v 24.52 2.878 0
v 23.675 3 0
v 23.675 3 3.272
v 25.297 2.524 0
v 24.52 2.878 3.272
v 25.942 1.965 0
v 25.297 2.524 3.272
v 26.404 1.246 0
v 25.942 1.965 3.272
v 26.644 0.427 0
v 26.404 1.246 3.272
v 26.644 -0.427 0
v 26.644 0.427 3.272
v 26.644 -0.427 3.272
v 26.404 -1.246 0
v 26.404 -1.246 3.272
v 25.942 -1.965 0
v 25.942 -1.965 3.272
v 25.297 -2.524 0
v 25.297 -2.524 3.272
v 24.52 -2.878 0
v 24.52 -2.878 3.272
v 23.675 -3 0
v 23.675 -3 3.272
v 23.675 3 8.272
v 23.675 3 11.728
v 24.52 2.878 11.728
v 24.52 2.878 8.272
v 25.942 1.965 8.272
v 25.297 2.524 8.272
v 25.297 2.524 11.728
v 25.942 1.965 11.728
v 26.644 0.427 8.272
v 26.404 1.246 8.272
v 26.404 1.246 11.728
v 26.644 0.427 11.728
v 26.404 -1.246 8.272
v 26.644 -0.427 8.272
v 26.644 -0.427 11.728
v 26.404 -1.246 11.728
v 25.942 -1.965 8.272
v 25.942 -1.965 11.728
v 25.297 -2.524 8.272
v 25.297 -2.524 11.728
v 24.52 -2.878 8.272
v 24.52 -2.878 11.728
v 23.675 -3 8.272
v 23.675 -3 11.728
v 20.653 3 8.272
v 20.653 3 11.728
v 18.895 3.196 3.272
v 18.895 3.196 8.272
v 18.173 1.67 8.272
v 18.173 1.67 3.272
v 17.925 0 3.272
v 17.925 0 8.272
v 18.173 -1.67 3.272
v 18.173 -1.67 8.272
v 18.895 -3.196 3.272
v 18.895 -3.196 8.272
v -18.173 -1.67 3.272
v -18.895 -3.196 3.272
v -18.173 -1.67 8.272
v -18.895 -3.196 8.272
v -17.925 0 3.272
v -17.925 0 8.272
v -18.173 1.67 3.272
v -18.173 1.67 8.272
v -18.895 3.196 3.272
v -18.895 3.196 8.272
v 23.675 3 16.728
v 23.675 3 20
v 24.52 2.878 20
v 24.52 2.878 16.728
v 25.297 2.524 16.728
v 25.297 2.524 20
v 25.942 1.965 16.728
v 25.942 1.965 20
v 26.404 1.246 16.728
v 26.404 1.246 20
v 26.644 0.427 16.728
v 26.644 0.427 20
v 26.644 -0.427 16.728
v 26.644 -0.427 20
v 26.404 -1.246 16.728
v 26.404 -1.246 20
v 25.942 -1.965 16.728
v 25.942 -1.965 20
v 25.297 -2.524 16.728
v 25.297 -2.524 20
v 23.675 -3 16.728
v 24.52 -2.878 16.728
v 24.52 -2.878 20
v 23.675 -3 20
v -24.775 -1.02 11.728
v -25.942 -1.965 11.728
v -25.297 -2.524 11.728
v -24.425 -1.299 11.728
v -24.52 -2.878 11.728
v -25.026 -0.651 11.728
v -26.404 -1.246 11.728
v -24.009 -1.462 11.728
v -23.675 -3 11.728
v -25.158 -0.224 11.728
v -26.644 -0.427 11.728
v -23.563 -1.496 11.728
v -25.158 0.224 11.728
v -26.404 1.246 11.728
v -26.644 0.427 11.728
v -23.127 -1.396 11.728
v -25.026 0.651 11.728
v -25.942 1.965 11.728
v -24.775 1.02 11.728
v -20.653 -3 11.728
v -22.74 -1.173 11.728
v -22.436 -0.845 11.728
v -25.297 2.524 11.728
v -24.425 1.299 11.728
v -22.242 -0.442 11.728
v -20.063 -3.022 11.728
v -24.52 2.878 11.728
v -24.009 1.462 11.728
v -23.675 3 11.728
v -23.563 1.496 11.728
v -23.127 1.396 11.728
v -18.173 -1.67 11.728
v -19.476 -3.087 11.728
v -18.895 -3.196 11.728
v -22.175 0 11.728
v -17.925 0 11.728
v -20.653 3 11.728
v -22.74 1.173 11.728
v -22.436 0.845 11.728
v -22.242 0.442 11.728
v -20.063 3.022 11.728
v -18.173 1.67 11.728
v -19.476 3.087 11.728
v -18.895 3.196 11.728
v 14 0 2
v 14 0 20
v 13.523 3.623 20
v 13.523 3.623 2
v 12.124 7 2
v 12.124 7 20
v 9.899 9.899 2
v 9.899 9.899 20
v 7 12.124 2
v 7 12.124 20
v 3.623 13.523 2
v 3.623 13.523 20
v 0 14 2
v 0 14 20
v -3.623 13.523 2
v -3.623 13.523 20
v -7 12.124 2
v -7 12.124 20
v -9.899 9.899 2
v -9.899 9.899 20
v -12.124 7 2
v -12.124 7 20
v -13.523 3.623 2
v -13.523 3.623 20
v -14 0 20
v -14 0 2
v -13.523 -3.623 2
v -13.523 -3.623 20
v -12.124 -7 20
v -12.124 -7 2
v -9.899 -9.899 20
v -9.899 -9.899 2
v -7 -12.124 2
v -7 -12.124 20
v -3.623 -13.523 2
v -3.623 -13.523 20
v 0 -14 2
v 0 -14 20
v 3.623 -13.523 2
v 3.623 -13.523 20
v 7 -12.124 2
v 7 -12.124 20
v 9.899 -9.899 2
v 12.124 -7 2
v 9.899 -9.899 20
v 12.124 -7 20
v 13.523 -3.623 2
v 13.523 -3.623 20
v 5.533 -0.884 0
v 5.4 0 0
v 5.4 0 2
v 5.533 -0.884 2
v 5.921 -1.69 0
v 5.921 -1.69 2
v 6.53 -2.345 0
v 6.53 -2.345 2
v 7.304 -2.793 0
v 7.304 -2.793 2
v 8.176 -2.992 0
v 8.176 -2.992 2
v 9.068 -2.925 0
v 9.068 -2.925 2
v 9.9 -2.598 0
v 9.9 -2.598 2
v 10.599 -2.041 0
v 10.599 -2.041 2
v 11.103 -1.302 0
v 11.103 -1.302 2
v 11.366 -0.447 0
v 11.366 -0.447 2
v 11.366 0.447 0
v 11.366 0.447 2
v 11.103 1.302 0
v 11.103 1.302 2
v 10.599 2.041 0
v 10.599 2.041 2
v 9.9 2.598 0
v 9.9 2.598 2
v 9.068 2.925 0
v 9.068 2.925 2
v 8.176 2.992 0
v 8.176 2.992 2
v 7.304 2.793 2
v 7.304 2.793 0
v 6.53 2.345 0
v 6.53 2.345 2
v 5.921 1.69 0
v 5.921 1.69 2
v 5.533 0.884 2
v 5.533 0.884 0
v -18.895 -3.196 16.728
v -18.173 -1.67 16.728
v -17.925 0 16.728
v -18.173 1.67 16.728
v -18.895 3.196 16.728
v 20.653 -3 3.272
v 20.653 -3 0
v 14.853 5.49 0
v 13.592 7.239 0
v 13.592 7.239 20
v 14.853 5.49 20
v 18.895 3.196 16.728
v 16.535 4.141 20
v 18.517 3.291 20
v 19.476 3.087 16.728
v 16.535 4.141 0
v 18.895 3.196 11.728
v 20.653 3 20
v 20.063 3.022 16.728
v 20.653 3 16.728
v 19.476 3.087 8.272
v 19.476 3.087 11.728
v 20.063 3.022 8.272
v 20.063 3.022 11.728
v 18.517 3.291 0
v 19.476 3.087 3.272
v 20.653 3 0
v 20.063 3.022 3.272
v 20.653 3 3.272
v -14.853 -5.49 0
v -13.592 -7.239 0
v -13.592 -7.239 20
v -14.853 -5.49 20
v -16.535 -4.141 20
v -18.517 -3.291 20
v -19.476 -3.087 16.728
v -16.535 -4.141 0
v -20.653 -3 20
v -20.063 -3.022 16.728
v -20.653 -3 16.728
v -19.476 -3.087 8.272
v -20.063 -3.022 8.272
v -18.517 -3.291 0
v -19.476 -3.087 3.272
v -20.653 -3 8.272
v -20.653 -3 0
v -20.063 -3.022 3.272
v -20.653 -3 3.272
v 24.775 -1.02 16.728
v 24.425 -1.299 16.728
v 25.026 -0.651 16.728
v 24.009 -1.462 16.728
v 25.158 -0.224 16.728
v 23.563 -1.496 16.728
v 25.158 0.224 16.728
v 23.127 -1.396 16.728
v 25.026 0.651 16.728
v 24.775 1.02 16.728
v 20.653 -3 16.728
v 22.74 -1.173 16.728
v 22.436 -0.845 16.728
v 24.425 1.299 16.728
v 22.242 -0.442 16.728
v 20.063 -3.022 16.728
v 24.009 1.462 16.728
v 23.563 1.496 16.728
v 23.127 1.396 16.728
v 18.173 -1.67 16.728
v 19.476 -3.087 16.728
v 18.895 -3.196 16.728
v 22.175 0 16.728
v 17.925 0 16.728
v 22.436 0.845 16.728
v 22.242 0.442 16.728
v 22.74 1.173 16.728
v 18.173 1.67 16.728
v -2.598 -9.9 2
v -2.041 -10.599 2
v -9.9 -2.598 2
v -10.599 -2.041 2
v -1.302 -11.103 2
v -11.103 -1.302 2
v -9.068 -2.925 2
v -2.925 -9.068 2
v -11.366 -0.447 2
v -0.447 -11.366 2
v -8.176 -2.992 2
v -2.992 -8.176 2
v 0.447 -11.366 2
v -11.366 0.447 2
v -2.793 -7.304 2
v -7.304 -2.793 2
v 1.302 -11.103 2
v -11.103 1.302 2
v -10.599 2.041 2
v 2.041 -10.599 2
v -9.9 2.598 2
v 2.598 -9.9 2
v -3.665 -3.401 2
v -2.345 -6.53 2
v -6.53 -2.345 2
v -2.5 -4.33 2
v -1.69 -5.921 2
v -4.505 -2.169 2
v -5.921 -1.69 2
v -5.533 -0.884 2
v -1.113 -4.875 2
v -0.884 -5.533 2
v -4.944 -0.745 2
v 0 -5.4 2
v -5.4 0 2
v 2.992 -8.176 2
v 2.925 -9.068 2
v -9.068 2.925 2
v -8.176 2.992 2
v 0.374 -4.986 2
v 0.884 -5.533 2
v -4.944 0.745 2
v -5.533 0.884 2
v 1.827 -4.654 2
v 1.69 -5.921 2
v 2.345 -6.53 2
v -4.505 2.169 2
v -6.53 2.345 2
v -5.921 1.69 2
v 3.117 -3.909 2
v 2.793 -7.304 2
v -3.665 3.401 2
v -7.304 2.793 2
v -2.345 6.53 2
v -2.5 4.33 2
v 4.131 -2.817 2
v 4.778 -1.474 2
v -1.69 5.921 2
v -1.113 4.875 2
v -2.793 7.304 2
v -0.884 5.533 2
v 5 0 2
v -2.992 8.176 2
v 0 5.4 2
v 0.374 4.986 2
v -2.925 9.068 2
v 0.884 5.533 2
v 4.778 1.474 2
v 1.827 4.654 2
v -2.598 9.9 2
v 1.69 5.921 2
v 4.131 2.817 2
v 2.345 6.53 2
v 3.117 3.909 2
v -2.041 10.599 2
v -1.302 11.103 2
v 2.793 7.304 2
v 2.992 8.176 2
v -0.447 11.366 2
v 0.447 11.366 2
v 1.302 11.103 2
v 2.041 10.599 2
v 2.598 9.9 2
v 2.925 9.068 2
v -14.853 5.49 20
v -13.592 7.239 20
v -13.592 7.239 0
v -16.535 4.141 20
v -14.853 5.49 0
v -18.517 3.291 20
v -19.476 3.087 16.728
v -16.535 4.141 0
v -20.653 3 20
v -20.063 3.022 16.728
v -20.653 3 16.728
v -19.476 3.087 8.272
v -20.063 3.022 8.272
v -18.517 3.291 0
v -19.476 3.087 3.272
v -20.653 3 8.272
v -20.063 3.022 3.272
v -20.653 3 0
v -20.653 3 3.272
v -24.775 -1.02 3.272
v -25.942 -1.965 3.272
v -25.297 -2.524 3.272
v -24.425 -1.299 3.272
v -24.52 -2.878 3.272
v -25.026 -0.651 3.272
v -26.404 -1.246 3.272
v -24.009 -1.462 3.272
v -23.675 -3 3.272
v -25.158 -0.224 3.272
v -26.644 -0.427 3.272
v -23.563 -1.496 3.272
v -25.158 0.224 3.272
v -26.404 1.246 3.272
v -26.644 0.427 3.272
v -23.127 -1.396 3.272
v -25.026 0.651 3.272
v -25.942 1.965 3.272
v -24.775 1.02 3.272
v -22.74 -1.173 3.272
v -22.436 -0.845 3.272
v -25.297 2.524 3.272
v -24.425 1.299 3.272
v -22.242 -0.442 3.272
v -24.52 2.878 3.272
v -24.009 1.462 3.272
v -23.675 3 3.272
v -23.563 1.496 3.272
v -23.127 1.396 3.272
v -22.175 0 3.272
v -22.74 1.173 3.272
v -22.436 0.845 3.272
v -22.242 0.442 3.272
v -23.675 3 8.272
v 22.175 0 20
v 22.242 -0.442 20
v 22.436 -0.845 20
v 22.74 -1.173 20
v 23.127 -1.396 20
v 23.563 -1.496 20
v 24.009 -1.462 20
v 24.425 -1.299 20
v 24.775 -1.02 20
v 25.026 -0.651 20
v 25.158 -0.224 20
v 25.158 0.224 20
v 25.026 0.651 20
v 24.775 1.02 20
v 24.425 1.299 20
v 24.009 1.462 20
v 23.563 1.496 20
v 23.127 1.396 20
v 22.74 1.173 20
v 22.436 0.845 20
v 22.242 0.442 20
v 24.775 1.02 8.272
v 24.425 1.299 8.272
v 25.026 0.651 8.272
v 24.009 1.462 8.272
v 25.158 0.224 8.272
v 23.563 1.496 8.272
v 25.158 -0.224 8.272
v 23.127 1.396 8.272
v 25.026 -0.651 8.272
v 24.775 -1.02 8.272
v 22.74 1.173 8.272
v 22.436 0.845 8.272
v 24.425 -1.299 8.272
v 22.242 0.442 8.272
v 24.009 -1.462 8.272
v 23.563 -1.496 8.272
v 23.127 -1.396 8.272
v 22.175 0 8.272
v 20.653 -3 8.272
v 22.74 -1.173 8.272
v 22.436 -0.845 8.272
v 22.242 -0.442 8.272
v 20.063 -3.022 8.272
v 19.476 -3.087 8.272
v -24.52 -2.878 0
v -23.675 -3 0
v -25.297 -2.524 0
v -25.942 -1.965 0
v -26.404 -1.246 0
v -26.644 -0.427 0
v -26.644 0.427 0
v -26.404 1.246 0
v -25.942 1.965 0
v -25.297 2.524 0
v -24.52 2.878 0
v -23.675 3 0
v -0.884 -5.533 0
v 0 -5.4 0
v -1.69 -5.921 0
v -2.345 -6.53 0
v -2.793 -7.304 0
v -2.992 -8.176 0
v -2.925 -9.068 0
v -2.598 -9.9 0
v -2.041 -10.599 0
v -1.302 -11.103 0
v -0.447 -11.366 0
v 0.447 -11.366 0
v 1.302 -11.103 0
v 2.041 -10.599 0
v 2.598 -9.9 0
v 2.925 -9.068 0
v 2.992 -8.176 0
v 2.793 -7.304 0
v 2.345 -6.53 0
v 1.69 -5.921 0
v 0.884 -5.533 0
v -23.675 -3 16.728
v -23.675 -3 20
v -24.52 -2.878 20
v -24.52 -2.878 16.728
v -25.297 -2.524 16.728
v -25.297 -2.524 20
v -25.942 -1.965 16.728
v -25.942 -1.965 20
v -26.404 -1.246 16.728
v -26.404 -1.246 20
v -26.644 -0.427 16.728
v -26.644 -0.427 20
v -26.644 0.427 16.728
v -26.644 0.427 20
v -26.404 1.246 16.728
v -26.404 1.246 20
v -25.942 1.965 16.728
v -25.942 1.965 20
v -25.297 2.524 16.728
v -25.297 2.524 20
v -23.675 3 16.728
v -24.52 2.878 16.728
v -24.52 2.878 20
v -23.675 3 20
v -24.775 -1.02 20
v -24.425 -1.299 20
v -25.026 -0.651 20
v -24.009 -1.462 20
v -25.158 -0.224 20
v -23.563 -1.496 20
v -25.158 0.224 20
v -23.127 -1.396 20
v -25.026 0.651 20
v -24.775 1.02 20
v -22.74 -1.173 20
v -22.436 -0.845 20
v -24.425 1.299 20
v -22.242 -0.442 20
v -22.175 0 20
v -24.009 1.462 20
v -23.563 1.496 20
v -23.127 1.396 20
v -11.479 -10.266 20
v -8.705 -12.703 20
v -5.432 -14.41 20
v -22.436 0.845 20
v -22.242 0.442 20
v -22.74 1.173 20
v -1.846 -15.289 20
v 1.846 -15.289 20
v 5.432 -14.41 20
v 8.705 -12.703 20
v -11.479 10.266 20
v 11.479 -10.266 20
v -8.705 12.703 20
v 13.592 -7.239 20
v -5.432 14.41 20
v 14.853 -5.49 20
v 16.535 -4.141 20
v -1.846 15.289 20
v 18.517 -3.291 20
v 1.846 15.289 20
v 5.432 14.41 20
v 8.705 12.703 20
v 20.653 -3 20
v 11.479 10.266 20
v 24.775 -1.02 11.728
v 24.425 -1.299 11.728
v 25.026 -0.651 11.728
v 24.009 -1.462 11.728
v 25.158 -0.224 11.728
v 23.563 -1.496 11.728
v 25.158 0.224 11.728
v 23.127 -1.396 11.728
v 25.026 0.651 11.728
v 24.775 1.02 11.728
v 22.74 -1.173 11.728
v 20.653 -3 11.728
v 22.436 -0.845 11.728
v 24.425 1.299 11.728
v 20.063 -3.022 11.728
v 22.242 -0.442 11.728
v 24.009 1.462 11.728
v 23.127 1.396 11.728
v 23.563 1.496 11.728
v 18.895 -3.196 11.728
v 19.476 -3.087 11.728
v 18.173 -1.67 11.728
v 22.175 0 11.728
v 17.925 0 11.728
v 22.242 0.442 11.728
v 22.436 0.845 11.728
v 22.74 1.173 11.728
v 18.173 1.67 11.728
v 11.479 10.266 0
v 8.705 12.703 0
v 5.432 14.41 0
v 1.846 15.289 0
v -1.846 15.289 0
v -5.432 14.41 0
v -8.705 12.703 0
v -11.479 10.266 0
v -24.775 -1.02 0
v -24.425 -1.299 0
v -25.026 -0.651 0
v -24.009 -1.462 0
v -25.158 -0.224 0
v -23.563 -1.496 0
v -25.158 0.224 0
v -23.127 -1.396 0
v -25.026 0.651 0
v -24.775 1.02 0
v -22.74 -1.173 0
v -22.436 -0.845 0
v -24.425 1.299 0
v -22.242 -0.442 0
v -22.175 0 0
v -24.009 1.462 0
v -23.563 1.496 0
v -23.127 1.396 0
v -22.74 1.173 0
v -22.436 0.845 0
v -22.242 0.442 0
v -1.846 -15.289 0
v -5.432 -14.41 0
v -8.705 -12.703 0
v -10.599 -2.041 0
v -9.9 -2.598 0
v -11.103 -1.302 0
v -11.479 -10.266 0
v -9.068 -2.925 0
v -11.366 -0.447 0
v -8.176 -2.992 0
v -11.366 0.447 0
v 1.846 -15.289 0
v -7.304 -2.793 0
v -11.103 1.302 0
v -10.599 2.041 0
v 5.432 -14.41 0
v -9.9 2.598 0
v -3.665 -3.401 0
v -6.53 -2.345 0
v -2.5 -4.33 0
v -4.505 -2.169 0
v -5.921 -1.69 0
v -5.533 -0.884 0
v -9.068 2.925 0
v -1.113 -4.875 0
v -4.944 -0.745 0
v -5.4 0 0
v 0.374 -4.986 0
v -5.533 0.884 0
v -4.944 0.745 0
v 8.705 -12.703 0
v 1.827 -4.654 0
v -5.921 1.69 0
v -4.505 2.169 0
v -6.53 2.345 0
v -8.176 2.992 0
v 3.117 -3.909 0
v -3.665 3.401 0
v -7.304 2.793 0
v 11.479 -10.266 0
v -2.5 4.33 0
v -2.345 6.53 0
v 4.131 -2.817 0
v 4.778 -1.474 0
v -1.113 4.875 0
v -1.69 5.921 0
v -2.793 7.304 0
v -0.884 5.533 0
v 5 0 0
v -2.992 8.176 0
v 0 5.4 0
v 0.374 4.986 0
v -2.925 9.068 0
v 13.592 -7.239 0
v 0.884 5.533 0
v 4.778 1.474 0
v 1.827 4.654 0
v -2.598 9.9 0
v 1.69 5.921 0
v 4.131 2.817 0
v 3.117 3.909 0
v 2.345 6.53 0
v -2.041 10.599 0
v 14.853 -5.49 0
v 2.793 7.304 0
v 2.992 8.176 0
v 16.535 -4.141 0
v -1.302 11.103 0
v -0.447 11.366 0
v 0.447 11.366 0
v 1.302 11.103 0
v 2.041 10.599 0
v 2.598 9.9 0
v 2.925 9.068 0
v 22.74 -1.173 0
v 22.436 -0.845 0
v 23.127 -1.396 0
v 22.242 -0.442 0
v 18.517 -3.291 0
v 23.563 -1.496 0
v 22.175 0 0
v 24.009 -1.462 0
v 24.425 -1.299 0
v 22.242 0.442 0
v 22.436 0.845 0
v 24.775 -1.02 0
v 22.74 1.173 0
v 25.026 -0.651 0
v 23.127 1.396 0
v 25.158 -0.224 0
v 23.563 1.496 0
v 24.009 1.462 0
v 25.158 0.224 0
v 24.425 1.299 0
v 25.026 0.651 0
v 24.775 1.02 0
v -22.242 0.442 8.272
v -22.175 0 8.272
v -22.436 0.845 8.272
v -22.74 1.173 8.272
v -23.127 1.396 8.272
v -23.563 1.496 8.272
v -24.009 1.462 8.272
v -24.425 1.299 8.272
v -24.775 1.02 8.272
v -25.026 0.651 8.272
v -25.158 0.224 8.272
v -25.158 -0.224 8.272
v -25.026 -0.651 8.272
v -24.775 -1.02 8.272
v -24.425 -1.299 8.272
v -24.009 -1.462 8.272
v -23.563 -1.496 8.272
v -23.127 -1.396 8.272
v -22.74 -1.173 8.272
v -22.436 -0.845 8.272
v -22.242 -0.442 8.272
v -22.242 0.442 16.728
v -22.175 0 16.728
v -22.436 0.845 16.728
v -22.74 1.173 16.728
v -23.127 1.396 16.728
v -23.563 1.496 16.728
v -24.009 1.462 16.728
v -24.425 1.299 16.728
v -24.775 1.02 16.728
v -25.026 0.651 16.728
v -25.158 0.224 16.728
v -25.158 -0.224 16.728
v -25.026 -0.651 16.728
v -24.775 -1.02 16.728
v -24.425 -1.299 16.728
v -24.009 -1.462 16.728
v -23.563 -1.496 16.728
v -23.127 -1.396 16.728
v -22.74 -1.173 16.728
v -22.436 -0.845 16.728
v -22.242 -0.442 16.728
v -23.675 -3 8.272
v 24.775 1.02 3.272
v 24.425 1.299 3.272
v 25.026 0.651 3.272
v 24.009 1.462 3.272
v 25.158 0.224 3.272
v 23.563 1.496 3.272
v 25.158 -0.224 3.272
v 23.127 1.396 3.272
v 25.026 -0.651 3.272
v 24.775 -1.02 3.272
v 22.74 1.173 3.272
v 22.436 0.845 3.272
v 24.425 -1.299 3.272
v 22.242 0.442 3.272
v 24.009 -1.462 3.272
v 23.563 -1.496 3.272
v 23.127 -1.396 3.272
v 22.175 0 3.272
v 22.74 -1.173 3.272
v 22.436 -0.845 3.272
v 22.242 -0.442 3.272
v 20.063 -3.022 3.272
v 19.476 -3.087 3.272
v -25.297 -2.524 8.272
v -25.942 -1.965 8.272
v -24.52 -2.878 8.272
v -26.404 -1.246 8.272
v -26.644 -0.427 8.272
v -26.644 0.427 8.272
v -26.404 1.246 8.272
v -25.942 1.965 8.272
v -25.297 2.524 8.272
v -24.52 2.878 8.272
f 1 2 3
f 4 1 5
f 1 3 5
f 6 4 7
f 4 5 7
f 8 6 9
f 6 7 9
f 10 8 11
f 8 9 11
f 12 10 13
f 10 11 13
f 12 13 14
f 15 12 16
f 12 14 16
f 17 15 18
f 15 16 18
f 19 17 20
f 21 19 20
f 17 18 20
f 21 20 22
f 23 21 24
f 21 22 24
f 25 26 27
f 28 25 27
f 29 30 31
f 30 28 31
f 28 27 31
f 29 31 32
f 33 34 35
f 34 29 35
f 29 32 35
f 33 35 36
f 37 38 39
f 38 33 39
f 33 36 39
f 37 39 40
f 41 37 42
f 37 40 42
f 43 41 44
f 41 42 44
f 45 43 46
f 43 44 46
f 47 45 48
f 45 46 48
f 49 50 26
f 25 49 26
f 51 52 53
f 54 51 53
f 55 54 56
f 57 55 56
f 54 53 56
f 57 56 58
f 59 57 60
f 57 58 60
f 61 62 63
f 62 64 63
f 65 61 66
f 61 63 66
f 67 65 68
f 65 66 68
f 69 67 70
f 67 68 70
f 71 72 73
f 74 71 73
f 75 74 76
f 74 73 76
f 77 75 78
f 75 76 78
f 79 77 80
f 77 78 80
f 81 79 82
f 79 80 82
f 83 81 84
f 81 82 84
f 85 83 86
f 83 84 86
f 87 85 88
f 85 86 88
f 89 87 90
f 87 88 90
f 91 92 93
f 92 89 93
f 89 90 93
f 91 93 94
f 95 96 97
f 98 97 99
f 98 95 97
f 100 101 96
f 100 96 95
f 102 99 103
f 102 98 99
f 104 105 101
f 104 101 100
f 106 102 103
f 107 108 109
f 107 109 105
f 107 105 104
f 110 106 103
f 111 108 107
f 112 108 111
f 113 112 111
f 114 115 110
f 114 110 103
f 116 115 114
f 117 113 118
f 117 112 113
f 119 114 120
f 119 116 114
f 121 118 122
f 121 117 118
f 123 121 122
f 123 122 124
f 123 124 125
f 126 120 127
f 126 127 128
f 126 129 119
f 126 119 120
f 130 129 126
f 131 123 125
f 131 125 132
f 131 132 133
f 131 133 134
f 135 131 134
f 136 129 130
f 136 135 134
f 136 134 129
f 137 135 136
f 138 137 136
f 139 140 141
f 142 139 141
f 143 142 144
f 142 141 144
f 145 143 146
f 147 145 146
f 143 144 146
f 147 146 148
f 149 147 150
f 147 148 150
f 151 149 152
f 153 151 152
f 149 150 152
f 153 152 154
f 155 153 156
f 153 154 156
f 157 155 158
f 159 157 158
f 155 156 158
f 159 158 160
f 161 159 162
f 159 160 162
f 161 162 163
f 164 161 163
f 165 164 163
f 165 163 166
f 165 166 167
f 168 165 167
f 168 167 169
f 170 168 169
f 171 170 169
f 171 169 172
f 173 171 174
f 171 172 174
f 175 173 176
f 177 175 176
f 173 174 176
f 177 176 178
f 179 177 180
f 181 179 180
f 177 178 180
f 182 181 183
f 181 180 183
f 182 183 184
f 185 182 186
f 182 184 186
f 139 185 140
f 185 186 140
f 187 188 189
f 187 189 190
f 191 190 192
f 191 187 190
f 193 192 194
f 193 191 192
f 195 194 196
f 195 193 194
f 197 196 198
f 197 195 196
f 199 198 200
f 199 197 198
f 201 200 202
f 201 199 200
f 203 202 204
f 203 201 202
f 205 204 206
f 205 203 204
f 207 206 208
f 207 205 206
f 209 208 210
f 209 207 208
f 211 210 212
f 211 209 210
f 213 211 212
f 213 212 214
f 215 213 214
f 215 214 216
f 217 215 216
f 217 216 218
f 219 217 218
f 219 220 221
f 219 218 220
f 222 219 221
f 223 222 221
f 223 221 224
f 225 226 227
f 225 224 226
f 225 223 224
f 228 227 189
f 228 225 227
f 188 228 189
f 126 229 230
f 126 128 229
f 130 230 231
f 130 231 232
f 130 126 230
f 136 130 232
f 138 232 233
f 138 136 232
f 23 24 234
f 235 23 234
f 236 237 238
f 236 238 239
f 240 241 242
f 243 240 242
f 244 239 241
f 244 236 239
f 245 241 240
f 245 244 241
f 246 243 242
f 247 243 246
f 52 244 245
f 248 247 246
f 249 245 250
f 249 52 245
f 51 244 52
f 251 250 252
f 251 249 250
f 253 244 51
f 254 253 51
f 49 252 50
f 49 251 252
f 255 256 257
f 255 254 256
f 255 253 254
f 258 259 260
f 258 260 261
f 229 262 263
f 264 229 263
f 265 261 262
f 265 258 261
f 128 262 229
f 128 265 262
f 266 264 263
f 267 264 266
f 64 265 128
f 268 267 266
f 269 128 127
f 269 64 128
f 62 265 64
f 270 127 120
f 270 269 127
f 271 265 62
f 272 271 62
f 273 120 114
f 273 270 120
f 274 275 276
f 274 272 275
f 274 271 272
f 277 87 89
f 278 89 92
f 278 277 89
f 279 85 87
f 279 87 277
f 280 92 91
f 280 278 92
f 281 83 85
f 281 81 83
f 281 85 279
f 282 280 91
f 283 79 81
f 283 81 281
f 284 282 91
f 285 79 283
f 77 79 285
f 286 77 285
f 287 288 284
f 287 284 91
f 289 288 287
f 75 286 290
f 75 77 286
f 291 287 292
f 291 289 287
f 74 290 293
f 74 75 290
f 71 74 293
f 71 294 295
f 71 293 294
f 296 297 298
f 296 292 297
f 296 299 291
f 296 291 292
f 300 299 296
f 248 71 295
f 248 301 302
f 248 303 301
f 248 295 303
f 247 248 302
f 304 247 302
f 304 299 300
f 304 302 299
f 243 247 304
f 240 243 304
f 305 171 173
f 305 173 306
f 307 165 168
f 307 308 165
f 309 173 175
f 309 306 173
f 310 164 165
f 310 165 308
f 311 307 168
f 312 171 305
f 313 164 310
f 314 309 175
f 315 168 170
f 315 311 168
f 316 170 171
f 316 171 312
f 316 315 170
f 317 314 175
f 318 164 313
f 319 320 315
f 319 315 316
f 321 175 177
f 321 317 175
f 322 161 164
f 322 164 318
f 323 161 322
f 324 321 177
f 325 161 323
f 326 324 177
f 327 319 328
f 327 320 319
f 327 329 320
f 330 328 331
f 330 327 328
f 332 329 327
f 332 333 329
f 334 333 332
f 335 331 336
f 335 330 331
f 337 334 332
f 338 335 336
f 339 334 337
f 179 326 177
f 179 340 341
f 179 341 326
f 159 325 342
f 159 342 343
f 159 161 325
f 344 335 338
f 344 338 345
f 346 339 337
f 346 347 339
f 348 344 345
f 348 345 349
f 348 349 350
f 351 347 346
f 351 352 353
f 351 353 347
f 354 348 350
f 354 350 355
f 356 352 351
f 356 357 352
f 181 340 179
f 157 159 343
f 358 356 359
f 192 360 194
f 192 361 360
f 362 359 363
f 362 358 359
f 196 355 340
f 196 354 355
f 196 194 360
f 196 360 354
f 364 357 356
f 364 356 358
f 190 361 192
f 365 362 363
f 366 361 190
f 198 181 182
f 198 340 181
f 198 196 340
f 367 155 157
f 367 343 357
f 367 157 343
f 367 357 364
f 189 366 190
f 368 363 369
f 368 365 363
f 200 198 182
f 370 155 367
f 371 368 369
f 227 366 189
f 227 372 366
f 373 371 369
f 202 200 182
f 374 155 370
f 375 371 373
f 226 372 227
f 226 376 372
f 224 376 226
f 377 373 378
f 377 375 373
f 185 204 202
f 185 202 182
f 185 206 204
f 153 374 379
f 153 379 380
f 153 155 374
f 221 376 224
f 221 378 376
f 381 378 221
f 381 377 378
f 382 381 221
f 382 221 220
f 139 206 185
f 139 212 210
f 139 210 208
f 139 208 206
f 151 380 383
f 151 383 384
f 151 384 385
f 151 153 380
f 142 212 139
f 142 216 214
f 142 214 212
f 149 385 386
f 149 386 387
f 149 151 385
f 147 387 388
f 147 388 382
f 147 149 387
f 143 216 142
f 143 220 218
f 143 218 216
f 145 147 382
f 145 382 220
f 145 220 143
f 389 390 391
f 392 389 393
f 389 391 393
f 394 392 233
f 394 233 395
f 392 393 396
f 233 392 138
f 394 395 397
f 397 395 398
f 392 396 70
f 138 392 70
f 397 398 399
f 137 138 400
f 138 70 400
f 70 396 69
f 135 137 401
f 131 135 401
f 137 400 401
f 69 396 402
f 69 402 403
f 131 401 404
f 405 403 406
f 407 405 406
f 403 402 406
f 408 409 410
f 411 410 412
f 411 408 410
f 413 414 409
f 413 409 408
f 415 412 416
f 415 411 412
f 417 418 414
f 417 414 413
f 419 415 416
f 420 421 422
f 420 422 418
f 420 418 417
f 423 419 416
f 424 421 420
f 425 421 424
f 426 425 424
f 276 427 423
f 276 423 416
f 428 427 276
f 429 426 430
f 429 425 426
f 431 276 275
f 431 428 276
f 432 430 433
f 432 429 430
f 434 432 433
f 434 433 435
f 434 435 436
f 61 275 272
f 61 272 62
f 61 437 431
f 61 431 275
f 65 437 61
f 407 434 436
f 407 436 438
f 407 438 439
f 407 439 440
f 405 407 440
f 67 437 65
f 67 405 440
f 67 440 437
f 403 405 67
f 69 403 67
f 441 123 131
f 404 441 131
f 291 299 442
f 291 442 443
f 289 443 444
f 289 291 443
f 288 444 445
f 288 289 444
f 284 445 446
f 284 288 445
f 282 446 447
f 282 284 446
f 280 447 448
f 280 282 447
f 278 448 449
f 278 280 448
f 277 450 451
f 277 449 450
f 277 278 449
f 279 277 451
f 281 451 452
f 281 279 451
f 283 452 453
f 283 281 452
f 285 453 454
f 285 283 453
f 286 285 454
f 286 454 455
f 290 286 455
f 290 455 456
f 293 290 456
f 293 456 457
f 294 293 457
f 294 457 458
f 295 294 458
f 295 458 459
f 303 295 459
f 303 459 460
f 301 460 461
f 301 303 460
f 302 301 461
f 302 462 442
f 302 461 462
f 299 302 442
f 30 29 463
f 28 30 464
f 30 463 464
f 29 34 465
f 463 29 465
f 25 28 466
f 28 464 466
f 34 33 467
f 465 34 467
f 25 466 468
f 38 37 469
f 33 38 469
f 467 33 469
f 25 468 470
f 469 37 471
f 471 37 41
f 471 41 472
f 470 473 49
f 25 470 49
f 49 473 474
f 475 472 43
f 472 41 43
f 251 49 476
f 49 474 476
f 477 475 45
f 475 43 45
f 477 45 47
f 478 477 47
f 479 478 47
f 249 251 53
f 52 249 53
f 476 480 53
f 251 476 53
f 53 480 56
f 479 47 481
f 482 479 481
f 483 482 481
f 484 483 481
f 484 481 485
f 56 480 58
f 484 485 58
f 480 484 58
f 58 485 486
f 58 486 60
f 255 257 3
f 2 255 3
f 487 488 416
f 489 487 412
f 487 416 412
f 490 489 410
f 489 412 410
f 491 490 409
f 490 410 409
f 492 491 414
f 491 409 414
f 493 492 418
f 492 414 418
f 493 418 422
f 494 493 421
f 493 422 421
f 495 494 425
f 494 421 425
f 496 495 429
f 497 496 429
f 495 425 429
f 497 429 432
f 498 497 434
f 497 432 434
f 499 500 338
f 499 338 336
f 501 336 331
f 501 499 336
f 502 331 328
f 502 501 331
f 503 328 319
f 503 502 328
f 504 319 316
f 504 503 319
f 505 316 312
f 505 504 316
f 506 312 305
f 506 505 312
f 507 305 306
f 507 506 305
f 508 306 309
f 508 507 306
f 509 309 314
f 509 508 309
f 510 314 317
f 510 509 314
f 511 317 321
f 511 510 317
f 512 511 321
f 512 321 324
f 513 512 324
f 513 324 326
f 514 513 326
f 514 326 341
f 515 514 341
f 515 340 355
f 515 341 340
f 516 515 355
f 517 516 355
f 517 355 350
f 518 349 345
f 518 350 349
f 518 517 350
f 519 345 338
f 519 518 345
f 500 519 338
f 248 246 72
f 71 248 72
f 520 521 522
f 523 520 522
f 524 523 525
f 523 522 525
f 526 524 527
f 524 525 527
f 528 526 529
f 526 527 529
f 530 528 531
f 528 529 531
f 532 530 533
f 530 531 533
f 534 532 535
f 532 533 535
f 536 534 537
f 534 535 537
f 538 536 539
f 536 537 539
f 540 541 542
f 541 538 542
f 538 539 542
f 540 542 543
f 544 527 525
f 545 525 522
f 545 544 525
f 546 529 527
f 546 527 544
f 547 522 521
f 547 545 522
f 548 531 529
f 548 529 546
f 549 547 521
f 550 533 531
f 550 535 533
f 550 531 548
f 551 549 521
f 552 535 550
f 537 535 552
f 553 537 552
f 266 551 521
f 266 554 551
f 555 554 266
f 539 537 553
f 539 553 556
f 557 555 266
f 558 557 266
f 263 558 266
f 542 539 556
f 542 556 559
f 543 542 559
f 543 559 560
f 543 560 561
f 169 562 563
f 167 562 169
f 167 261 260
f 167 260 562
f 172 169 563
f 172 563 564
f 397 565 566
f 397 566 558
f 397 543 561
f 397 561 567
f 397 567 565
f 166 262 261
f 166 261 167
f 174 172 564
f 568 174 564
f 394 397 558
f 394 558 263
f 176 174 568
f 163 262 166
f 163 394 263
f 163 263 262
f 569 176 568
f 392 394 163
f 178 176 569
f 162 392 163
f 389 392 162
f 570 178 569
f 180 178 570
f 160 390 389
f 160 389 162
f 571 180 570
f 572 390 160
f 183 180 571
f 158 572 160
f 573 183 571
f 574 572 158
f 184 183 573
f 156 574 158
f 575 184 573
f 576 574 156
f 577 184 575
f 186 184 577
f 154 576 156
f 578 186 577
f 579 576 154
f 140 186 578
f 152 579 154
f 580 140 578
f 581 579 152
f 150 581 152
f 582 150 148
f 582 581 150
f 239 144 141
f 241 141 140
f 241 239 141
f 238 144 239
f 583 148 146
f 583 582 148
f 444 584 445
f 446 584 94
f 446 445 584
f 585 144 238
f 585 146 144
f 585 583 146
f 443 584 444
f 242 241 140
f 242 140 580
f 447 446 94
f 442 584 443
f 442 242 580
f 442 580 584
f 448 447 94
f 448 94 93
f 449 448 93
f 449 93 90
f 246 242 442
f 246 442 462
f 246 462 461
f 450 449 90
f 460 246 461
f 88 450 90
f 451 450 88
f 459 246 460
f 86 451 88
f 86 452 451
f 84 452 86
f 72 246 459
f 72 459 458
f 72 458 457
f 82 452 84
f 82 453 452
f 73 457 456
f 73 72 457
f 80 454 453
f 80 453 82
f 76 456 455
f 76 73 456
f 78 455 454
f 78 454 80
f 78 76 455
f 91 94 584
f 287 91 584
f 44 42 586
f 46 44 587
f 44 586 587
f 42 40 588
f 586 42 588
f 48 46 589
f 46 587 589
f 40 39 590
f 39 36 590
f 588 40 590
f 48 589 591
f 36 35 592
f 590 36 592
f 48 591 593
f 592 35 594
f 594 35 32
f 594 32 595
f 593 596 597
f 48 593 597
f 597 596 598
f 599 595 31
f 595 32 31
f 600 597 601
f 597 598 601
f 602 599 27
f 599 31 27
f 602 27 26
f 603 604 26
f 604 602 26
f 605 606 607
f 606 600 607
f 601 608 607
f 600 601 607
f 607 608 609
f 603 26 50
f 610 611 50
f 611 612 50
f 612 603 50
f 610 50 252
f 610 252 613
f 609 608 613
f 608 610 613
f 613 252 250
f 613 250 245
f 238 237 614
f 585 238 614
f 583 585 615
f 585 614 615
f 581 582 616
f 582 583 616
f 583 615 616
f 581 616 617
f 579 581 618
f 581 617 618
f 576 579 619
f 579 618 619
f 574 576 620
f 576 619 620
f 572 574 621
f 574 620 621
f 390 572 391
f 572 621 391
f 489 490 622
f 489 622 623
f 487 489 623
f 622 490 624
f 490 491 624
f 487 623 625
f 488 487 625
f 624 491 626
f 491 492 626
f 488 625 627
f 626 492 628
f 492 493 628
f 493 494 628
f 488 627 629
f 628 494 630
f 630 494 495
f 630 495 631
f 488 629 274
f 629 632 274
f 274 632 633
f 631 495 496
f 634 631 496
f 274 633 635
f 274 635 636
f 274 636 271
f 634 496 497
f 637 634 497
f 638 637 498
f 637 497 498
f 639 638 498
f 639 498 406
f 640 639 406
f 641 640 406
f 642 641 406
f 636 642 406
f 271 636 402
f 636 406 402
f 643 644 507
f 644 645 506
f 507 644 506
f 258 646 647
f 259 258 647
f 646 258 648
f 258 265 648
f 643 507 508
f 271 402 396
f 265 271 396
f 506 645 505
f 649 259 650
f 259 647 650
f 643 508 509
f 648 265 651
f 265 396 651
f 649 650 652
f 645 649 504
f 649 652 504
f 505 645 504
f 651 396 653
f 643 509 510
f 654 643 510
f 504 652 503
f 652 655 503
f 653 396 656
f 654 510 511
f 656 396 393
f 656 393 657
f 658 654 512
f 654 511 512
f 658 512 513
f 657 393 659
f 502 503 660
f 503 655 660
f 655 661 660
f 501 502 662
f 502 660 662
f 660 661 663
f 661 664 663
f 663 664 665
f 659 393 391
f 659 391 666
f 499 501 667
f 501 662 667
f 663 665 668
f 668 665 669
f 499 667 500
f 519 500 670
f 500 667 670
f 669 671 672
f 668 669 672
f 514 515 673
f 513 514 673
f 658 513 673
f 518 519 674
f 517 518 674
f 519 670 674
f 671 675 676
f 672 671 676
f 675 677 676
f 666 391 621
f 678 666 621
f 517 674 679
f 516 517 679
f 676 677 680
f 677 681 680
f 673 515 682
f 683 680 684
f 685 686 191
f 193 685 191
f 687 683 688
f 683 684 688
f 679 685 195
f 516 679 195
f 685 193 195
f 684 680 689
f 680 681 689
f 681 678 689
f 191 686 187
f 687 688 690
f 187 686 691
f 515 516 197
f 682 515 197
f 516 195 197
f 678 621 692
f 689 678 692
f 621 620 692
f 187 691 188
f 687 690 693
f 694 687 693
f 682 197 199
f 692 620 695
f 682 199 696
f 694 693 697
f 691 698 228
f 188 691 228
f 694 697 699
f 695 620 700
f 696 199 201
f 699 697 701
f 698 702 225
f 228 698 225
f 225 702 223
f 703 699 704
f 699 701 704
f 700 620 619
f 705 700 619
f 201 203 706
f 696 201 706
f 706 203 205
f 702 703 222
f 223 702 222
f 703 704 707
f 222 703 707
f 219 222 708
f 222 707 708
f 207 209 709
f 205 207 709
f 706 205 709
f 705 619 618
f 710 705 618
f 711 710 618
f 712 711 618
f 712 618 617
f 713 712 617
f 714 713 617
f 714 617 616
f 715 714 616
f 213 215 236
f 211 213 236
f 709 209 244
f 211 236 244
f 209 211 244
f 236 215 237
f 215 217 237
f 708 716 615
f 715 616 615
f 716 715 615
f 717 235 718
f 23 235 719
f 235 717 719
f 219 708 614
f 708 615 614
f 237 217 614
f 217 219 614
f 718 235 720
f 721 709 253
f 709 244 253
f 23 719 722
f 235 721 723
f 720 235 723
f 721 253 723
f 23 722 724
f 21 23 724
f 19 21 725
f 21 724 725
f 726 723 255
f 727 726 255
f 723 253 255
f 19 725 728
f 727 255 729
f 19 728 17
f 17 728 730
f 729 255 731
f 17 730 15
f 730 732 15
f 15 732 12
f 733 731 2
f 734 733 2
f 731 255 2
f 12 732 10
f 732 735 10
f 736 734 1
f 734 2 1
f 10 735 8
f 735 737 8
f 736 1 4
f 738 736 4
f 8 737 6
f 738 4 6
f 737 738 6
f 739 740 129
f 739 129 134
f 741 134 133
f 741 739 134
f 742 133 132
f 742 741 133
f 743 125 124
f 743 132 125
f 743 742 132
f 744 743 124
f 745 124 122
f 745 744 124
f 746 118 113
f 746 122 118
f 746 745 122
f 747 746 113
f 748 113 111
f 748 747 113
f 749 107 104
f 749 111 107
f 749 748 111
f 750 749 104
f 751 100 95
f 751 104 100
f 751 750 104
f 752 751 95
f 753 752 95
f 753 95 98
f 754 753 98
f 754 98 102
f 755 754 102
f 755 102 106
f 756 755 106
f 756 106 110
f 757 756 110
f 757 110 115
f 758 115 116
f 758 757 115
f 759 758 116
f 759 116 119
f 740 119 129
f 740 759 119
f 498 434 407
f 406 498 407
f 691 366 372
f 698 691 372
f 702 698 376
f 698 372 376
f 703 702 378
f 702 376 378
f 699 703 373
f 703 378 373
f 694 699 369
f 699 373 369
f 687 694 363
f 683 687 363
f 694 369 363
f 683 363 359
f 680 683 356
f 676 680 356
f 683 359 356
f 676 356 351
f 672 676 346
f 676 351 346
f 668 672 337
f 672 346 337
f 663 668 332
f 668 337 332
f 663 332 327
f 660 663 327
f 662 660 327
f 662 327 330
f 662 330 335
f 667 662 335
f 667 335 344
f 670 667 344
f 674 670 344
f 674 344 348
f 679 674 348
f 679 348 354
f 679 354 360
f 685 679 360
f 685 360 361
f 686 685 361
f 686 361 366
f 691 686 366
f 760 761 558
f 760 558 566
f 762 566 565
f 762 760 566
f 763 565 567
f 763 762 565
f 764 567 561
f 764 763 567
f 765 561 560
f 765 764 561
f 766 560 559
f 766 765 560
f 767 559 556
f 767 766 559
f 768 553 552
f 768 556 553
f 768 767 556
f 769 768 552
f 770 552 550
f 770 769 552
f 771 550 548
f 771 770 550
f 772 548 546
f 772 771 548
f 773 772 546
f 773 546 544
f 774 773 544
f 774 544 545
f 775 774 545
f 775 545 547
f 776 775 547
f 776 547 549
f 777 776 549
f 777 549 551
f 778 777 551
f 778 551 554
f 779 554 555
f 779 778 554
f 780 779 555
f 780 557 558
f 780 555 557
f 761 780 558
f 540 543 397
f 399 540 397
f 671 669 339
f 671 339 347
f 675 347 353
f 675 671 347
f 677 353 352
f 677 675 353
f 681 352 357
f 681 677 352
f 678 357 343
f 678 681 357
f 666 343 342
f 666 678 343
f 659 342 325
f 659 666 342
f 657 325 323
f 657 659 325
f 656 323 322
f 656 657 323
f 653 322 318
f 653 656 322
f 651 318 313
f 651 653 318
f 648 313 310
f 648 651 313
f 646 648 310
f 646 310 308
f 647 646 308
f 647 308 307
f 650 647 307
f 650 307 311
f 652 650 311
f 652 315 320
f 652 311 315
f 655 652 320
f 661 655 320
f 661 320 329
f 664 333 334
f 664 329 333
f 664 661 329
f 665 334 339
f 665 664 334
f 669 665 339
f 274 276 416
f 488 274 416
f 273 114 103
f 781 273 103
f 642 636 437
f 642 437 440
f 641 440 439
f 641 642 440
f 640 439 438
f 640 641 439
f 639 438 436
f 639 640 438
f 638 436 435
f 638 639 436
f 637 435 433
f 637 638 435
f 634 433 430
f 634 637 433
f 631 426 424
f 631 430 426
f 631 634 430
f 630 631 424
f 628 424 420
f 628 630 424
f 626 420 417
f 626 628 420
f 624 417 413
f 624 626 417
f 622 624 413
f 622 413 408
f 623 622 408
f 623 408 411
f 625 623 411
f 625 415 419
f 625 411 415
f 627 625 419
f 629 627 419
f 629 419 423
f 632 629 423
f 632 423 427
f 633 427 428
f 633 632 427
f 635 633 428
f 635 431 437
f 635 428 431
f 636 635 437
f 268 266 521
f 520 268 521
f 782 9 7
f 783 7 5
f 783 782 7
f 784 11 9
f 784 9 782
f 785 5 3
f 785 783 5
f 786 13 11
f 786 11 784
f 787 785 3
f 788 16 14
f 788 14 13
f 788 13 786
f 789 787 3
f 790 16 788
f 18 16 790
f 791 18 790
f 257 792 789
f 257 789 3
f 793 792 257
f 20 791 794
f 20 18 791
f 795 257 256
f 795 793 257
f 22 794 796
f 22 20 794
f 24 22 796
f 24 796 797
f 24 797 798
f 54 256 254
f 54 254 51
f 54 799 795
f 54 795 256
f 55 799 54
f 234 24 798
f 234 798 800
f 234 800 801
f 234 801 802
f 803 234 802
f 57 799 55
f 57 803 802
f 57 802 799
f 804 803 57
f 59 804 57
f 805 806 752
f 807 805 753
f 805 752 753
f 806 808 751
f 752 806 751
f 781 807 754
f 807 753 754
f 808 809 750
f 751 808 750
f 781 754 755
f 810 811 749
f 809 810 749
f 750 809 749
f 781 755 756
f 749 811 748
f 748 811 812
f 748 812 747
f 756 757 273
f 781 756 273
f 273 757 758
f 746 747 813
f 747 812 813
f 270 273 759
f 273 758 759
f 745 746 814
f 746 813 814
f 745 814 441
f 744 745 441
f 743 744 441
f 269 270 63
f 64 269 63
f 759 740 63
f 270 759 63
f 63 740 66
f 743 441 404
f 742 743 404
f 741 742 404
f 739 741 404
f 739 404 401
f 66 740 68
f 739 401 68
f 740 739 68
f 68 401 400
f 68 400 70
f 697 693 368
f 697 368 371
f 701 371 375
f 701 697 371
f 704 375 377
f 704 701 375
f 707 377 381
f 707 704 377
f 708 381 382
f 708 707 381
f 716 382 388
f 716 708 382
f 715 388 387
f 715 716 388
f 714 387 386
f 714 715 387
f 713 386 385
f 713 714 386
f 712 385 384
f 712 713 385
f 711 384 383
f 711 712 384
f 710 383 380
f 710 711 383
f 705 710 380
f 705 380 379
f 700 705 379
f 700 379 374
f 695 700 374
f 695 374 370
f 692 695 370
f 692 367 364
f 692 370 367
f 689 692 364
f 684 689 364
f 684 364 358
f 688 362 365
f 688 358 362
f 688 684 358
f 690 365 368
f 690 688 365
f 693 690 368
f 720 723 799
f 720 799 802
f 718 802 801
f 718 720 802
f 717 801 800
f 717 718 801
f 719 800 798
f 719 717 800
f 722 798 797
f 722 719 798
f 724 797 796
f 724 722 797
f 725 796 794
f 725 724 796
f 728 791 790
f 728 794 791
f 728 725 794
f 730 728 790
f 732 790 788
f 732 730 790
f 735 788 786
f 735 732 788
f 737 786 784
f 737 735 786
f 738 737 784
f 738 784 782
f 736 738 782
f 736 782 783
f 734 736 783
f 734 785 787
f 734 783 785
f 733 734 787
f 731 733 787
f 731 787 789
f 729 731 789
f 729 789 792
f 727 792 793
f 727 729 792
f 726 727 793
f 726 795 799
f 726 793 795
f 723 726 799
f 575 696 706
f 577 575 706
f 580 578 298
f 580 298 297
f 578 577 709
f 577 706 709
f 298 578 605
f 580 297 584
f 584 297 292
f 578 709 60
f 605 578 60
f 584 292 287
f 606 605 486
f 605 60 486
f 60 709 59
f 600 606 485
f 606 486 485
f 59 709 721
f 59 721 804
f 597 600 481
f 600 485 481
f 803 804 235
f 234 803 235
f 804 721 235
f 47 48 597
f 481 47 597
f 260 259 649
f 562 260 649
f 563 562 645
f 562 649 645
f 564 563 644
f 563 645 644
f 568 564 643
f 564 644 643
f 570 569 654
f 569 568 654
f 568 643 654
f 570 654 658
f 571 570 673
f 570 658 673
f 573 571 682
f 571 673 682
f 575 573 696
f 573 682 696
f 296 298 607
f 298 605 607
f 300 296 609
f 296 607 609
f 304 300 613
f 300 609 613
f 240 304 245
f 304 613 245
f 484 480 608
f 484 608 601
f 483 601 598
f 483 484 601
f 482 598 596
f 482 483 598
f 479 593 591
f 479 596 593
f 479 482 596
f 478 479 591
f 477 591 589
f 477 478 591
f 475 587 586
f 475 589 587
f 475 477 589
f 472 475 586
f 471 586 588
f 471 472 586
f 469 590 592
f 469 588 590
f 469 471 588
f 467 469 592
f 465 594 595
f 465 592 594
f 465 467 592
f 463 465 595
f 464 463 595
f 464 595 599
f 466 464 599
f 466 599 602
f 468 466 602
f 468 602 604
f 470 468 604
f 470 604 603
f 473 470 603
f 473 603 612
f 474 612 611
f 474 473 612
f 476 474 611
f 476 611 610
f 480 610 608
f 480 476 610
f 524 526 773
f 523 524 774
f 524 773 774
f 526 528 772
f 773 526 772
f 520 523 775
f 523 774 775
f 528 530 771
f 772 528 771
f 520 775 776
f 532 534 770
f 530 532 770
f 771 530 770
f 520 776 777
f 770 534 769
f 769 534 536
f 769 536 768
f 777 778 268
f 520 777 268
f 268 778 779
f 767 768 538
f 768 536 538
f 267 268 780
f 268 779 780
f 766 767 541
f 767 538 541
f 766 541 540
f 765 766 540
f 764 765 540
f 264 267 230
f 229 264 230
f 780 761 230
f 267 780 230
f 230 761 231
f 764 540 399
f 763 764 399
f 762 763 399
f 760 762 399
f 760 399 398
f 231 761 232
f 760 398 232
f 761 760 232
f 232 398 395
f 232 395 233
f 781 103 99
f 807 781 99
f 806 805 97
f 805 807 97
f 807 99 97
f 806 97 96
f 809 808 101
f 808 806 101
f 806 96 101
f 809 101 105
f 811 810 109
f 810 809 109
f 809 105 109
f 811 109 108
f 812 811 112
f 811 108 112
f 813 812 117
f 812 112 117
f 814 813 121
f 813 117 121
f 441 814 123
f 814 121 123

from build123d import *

# Parameters (mm, degrees)
SKETCH1_R                 = 15.4
BOSS_EXTRUDE1_DEPTH       = 20
BOSS_EXTRUDE2_DEPTH       = 20
FILLET4_R                 = 8
CIRPATTERN11_COUNT        = 2
FILLET4_OF_CIRPATTERN11_R = 8
SKETCH4_R                 = 14
CUT_EXTRUDE3_DEPTH        = 18
SKETCH5_R                 = 5
CUT_EXTRUDE4_DEPTH        = 19
CUT_EXTRUDE4_DEPTH_BACK   = 3
CUT_EXTRUDE5_START        = -3
SKETCH7_R                 = 3
CUT_EXTRUDE5_DEPTH        = 22
CIRPATTERN12_COUNT        = 4
CUT_EXTRUDE1_START        = -21
SKETCH2_R                 = 1.5
CUT_EXTRUDE1_DEPTH        = 22
CIRPATTERN10_COUNT        = 2
SKETCH3_R                 = 5.75
CUT_EXTRUDE2_DEPTH        = 2.5
CIRPATTERN3_COUNT         = 2
MIRROR1_COPY_1_SKETCH_R   = 5.75
MIRROR1_COPY_1_DEPTH      = 2.5


with BuildPart() as part:
    # Sketch1 → Boss-Extrude1 (new body)
    with BuildSketch(Plane.XY):
        Circle(SKETCH1_R)
    extrude(amount=BOSS_EXTRUDE1_DEPTH)

    # Sketch6 → Boss-Extrude2 (add)
    with BuildSketch(Plane.XY.offset(20)):
        with BuildLine():
            Line((-23.675, 3), (-15.104966071, 3))
            ThreePointArc((-15.104966071, 3), (-15.4, 0), (-15.104966071, -3))
            Line((-15.104966071, -3), (-23.675, -3))
            ThreePointArc((-23.675, -3), (-26.675, 0), (-23.675, 3))
        make_face()
    boss_extrude2 = extrude(amount=-BOSS_EXTRUDE2_DEPTH)

    # Fillet4
    fillet4_edges = [part.edges().sort_by_distance(p)[0] for p in [
        (-15.104966071, 3, 10),
        (-15.104966071, -3, 10),
    ]]
    fillet(fillet4_edges, radius=FILLET4_R)

    # CirPattern11: Boss-Extrude2 ×2 about axis
    cirpattern11_axis = Axis((0, 0, 0), (0, 0, 1))
    for i in range(1, CIRPATTERN11_COUNT):
        add(boss_extrude2.rotate(cirpattern11_axis, i * 360 / CIRPATTERN11_COUNT))

    # Fillet4 of CirPattern11
    fillet4_of_cirpattern11_edges = [part.edges().sort_by_distance(p)[0] for p in [
        (15.104966071, -3, 10),
        (15.104966071, 3, 10),
    ]]
    fillet(fillet4_of_cirpattern11_edges, radius=FILLET4_OF_CIRPATTERN11_R)

    # Sketch4 → Cut-Extrude3 (cut)
    with BuildSketch(Plane.XY.offset(20)):
        Circle(SKETCH4_R)
    extrude(amount=-CUT_EXTRUDE3_DEPTH, mode=Mode.SUBTRACT)

    # Sketch5 → Cut-Extrude4 (cut, two sides)
    with BuildSketch(Plane.XY.offset(2)) as cut_extrude4_sk:
        Circle(SKETCH5_R)
    extrude(amount=CUT_EXTRUDE4_DEPTH, mode=Mode.SUBTRACT)
    extrude(cut_extrude4_sk.sketch, amount=-CUT_EXTRUDE4_DEPTH_BACK, mode=Mode.SUBTRACT)

    # Sketch7 → Cut-Extrude5 (cut)
    with BuildSketch(Plane.XY.offset(2).offset(CUT_EXTRUDE5_START)):
        with Locations((-8.4, 0)):
            Circle(SKETCH7_R)
    cut_extrude5 = extrude(amount=CUT_EXTRUDE5_DEPTH, mode=Mode.SUBTRACT)

    # CirPattern12: Cut-Extrude5 ×4 about axis
    cirpattern12_axis = Axis((0, 0, 0), (0, 0, 1))
    for i in range(1, CIRPATTERN12_COUNT):
        add(cut_extrude5.rotate(cirpattern12_axis, i * 360 / CIRPATTERN12_COUNT), mode=Mode.SUBTRACT)

    # Sketch2 → Cut-Extrude1 (cut)
    with BuildSketch(Plane.XY.offset(20).offset(CUT_EXTRUDE1_START)):
        with Locations((-23.675, 0)):
            Circle(SKETCH2_R)
    cut_extrude1 = extrude(amount=CUT_EXTRUDE1_DEPTH, mode=Mode.SUBTRACT)

    # CirPattern10: Cut-Extrude1 ×2 about axis
    cirpattern10_axis = Axis((0, 0, 0), (0, 0, 1))
    for i in range(1, CIRPATTERN10_COUNT):
        add(cut_extrude1.rotate(cirpattern10_axis, i * 360 / CIRPATTERN10_COUNT), mode=Mode.SUBTRACT)

    # Sketch3 → Cut-Extrude2 (cut, symmetric)
    with BuildSketch(Plane.XY.offset(5.771567898)):
        with Locations((-23.675, 0)):
            Circle(SKETCH3_R)
    cut_extrude2 = extrude(amount=CUT_EXTRUDE2_DEPTH, both=True, mode=Mode.SUBTRACT)

    # CirPattern3: Cut-Extrude2 ×2 about axis
    cirpattern3_axis = Axis((0, 0, 0), (0, 0, 1))
    for i in range(1, CIRPATTERN3_COUNT):
        add(cut_extrude2.rotate(cirpattern3_axis, i * 360 / CIRPATTERN3_COUNT), mode=Mode.SUBTRACT)

    # Mirror1: Cut-Extrude2 across plane
    add(cut_extrude2.mirror(Plane.XY.offset(10)), mode=Mode.SUBTRACT)

    # Mirror1 copy 1 sketch → Mirror1 copy 1 (cut, symmetric)
    with BuildSketch(Plane(origin=(0, 0, 14.228432102), x_dir=(-1, 0, 0), z_dir=(0, 0, -1))):
        with Locations((-23.675, 0)):
            Circle(MIRROR1_COPY_1_SKETCH_R)
    extrude(amount=MIRROR1_COPY_1_DEPTH, both=True, mode=Mode.SUBTRACT)


solid = part.part
